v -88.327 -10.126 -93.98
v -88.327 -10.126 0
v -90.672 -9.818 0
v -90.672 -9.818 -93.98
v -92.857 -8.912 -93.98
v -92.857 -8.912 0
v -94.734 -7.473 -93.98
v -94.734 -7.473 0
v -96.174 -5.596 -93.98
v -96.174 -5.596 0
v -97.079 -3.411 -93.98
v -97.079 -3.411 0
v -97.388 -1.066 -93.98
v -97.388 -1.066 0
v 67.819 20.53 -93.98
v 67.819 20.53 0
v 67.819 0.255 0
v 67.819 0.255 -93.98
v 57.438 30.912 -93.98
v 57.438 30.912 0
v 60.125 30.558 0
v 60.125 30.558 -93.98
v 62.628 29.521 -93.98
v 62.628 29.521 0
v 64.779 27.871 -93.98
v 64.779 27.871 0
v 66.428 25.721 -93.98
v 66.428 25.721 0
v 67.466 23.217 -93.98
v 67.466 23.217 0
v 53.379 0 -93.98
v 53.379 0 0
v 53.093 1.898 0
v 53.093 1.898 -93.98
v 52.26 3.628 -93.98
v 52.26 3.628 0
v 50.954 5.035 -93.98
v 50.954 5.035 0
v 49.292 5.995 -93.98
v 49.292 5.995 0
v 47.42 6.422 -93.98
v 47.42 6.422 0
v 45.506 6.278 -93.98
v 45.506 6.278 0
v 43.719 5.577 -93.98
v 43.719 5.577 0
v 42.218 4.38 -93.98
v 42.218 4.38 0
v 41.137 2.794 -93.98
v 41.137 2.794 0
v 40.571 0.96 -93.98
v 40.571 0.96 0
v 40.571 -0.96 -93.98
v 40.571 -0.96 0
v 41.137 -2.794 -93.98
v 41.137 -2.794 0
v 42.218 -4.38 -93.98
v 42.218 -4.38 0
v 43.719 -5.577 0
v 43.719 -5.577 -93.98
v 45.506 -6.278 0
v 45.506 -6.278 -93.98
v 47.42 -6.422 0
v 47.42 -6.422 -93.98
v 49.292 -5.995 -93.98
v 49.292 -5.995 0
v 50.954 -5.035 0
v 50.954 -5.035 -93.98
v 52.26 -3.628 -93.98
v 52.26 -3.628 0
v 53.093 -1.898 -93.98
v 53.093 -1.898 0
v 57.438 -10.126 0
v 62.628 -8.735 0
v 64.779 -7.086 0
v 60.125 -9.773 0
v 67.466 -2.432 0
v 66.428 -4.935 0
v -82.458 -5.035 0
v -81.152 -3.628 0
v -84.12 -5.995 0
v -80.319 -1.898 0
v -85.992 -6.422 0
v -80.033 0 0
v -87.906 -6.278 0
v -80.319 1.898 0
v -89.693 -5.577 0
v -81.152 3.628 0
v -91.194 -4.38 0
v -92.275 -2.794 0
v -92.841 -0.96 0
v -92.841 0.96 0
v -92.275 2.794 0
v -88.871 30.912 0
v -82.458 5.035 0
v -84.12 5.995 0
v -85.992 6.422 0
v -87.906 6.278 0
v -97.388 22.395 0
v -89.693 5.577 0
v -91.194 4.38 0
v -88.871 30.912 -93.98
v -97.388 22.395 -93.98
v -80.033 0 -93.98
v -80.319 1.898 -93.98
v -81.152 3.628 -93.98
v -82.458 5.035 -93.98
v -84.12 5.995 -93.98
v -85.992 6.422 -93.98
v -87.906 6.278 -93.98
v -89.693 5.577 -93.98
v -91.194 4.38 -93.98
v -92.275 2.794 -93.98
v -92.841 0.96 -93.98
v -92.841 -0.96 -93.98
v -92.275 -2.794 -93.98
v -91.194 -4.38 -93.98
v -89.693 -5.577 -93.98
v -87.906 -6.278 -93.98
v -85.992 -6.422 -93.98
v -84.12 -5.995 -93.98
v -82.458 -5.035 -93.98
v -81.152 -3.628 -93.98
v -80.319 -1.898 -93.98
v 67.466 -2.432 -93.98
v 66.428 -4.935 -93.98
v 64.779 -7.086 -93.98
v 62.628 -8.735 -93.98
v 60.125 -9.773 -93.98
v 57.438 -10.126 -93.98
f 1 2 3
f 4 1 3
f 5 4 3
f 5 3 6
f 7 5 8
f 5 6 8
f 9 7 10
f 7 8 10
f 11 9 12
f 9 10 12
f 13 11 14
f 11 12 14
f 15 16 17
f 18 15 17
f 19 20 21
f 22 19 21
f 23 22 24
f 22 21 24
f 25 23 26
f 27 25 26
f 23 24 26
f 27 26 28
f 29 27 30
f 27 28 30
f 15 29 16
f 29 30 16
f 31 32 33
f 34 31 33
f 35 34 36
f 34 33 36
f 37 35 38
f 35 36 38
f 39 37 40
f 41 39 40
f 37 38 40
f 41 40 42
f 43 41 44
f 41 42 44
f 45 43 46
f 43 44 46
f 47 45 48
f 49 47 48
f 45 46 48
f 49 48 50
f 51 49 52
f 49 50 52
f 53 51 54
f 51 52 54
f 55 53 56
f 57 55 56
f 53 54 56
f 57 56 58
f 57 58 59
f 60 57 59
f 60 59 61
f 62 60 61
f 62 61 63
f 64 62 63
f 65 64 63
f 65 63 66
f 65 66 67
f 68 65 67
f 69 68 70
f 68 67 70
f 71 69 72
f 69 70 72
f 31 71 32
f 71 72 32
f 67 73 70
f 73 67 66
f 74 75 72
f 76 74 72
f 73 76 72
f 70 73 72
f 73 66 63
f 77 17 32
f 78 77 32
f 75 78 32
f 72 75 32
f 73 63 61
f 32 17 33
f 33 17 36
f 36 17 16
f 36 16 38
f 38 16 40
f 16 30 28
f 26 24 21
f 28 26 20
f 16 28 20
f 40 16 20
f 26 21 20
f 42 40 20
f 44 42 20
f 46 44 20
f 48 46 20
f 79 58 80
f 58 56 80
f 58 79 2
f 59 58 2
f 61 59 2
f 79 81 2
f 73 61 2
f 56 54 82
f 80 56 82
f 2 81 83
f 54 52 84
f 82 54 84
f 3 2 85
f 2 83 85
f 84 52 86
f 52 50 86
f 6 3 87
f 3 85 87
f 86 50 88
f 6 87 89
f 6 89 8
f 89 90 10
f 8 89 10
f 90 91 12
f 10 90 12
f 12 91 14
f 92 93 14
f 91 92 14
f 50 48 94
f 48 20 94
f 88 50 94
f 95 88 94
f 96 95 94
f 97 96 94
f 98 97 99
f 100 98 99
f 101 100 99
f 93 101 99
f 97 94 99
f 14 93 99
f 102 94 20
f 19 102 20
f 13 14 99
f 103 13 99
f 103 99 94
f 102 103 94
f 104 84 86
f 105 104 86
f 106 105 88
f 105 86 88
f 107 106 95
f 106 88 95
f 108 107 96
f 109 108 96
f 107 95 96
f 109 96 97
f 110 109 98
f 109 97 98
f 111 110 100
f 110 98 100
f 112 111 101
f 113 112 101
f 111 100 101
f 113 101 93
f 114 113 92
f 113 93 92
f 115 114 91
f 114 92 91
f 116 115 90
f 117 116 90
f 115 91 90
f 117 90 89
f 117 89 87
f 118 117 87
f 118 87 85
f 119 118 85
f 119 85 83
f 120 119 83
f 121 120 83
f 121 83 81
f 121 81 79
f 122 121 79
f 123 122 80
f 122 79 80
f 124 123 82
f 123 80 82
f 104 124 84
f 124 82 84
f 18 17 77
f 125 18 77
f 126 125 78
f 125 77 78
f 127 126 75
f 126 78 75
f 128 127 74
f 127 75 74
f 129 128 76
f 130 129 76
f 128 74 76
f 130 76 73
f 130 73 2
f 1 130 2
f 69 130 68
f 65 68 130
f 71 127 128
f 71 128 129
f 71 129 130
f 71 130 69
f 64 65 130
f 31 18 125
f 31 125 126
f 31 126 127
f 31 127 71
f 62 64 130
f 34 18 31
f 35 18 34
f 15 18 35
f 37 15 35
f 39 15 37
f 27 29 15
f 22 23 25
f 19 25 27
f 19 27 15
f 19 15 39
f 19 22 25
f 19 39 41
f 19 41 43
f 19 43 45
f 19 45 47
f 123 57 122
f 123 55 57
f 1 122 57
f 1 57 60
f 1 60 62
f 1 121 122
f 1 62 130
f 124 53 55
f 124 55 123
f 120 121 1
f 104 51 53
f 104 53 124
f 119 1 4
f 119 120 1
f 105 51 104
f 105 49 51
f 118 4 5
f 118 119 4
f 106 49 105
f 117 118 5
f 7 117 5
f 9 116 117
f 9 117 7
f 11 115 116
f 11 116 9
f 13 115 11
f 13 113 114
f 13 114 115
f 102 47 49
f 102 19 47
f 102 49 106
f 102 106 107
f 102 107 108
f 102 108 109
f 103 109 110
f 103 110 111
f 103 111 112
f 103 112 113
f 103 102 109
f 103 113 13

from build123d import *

# Parameters (mm, degrees)
SKETCH1_R           = 6.439788541
BOSS_EXTRUDE3_DEPTH = 93.98


with BuildPart() as part:
    # Sketch1 → Boss-Extrude3 (new body)
    with BuildSketch(Plane.XY):
        with BuildLine():
            Line((-88.871195362, 30.911720126), (57.437556069, 30.911720126))
            ThreePointArc((57.437556069, 30.911720126), (64.778520858, 27.870992949), (67.819248035, 20.53002816))
            Line((67.819248035, 20.53002816), (67.819248035, 0.255438821))
            ThreePointArc((67.819248035, 0.255438821), (64.778520858, -7.085525968), (57.437556069, -10.126253145))
            Line((57.437556069, -10.126253145), (-88.327193145, -10.126253145))
            ThreePointArc((-88.327193145, -10.126253145), (-94.733815173, -7.472543412), (-97.387524906, -1.065921384))
            Line((-97.387524906, -1.065921384), (-97.387524906, 22.395390582))
            Line((-97.387524906, 22.395390582), (-88.871195362, 30.911720126))
        make_face()
        with Locations((-86.472872248, 0)):
            Circle(SKETCH1_R, mode=Mode.SUBTRACT)
        with Locations((46.939064733, 0)):
            Circle(SKETCH1_R, mode=Mode.SUBTRACT)
    extrude(amount=-BOSS_EXTRUDE3_DEPTH)


solid = part.part
